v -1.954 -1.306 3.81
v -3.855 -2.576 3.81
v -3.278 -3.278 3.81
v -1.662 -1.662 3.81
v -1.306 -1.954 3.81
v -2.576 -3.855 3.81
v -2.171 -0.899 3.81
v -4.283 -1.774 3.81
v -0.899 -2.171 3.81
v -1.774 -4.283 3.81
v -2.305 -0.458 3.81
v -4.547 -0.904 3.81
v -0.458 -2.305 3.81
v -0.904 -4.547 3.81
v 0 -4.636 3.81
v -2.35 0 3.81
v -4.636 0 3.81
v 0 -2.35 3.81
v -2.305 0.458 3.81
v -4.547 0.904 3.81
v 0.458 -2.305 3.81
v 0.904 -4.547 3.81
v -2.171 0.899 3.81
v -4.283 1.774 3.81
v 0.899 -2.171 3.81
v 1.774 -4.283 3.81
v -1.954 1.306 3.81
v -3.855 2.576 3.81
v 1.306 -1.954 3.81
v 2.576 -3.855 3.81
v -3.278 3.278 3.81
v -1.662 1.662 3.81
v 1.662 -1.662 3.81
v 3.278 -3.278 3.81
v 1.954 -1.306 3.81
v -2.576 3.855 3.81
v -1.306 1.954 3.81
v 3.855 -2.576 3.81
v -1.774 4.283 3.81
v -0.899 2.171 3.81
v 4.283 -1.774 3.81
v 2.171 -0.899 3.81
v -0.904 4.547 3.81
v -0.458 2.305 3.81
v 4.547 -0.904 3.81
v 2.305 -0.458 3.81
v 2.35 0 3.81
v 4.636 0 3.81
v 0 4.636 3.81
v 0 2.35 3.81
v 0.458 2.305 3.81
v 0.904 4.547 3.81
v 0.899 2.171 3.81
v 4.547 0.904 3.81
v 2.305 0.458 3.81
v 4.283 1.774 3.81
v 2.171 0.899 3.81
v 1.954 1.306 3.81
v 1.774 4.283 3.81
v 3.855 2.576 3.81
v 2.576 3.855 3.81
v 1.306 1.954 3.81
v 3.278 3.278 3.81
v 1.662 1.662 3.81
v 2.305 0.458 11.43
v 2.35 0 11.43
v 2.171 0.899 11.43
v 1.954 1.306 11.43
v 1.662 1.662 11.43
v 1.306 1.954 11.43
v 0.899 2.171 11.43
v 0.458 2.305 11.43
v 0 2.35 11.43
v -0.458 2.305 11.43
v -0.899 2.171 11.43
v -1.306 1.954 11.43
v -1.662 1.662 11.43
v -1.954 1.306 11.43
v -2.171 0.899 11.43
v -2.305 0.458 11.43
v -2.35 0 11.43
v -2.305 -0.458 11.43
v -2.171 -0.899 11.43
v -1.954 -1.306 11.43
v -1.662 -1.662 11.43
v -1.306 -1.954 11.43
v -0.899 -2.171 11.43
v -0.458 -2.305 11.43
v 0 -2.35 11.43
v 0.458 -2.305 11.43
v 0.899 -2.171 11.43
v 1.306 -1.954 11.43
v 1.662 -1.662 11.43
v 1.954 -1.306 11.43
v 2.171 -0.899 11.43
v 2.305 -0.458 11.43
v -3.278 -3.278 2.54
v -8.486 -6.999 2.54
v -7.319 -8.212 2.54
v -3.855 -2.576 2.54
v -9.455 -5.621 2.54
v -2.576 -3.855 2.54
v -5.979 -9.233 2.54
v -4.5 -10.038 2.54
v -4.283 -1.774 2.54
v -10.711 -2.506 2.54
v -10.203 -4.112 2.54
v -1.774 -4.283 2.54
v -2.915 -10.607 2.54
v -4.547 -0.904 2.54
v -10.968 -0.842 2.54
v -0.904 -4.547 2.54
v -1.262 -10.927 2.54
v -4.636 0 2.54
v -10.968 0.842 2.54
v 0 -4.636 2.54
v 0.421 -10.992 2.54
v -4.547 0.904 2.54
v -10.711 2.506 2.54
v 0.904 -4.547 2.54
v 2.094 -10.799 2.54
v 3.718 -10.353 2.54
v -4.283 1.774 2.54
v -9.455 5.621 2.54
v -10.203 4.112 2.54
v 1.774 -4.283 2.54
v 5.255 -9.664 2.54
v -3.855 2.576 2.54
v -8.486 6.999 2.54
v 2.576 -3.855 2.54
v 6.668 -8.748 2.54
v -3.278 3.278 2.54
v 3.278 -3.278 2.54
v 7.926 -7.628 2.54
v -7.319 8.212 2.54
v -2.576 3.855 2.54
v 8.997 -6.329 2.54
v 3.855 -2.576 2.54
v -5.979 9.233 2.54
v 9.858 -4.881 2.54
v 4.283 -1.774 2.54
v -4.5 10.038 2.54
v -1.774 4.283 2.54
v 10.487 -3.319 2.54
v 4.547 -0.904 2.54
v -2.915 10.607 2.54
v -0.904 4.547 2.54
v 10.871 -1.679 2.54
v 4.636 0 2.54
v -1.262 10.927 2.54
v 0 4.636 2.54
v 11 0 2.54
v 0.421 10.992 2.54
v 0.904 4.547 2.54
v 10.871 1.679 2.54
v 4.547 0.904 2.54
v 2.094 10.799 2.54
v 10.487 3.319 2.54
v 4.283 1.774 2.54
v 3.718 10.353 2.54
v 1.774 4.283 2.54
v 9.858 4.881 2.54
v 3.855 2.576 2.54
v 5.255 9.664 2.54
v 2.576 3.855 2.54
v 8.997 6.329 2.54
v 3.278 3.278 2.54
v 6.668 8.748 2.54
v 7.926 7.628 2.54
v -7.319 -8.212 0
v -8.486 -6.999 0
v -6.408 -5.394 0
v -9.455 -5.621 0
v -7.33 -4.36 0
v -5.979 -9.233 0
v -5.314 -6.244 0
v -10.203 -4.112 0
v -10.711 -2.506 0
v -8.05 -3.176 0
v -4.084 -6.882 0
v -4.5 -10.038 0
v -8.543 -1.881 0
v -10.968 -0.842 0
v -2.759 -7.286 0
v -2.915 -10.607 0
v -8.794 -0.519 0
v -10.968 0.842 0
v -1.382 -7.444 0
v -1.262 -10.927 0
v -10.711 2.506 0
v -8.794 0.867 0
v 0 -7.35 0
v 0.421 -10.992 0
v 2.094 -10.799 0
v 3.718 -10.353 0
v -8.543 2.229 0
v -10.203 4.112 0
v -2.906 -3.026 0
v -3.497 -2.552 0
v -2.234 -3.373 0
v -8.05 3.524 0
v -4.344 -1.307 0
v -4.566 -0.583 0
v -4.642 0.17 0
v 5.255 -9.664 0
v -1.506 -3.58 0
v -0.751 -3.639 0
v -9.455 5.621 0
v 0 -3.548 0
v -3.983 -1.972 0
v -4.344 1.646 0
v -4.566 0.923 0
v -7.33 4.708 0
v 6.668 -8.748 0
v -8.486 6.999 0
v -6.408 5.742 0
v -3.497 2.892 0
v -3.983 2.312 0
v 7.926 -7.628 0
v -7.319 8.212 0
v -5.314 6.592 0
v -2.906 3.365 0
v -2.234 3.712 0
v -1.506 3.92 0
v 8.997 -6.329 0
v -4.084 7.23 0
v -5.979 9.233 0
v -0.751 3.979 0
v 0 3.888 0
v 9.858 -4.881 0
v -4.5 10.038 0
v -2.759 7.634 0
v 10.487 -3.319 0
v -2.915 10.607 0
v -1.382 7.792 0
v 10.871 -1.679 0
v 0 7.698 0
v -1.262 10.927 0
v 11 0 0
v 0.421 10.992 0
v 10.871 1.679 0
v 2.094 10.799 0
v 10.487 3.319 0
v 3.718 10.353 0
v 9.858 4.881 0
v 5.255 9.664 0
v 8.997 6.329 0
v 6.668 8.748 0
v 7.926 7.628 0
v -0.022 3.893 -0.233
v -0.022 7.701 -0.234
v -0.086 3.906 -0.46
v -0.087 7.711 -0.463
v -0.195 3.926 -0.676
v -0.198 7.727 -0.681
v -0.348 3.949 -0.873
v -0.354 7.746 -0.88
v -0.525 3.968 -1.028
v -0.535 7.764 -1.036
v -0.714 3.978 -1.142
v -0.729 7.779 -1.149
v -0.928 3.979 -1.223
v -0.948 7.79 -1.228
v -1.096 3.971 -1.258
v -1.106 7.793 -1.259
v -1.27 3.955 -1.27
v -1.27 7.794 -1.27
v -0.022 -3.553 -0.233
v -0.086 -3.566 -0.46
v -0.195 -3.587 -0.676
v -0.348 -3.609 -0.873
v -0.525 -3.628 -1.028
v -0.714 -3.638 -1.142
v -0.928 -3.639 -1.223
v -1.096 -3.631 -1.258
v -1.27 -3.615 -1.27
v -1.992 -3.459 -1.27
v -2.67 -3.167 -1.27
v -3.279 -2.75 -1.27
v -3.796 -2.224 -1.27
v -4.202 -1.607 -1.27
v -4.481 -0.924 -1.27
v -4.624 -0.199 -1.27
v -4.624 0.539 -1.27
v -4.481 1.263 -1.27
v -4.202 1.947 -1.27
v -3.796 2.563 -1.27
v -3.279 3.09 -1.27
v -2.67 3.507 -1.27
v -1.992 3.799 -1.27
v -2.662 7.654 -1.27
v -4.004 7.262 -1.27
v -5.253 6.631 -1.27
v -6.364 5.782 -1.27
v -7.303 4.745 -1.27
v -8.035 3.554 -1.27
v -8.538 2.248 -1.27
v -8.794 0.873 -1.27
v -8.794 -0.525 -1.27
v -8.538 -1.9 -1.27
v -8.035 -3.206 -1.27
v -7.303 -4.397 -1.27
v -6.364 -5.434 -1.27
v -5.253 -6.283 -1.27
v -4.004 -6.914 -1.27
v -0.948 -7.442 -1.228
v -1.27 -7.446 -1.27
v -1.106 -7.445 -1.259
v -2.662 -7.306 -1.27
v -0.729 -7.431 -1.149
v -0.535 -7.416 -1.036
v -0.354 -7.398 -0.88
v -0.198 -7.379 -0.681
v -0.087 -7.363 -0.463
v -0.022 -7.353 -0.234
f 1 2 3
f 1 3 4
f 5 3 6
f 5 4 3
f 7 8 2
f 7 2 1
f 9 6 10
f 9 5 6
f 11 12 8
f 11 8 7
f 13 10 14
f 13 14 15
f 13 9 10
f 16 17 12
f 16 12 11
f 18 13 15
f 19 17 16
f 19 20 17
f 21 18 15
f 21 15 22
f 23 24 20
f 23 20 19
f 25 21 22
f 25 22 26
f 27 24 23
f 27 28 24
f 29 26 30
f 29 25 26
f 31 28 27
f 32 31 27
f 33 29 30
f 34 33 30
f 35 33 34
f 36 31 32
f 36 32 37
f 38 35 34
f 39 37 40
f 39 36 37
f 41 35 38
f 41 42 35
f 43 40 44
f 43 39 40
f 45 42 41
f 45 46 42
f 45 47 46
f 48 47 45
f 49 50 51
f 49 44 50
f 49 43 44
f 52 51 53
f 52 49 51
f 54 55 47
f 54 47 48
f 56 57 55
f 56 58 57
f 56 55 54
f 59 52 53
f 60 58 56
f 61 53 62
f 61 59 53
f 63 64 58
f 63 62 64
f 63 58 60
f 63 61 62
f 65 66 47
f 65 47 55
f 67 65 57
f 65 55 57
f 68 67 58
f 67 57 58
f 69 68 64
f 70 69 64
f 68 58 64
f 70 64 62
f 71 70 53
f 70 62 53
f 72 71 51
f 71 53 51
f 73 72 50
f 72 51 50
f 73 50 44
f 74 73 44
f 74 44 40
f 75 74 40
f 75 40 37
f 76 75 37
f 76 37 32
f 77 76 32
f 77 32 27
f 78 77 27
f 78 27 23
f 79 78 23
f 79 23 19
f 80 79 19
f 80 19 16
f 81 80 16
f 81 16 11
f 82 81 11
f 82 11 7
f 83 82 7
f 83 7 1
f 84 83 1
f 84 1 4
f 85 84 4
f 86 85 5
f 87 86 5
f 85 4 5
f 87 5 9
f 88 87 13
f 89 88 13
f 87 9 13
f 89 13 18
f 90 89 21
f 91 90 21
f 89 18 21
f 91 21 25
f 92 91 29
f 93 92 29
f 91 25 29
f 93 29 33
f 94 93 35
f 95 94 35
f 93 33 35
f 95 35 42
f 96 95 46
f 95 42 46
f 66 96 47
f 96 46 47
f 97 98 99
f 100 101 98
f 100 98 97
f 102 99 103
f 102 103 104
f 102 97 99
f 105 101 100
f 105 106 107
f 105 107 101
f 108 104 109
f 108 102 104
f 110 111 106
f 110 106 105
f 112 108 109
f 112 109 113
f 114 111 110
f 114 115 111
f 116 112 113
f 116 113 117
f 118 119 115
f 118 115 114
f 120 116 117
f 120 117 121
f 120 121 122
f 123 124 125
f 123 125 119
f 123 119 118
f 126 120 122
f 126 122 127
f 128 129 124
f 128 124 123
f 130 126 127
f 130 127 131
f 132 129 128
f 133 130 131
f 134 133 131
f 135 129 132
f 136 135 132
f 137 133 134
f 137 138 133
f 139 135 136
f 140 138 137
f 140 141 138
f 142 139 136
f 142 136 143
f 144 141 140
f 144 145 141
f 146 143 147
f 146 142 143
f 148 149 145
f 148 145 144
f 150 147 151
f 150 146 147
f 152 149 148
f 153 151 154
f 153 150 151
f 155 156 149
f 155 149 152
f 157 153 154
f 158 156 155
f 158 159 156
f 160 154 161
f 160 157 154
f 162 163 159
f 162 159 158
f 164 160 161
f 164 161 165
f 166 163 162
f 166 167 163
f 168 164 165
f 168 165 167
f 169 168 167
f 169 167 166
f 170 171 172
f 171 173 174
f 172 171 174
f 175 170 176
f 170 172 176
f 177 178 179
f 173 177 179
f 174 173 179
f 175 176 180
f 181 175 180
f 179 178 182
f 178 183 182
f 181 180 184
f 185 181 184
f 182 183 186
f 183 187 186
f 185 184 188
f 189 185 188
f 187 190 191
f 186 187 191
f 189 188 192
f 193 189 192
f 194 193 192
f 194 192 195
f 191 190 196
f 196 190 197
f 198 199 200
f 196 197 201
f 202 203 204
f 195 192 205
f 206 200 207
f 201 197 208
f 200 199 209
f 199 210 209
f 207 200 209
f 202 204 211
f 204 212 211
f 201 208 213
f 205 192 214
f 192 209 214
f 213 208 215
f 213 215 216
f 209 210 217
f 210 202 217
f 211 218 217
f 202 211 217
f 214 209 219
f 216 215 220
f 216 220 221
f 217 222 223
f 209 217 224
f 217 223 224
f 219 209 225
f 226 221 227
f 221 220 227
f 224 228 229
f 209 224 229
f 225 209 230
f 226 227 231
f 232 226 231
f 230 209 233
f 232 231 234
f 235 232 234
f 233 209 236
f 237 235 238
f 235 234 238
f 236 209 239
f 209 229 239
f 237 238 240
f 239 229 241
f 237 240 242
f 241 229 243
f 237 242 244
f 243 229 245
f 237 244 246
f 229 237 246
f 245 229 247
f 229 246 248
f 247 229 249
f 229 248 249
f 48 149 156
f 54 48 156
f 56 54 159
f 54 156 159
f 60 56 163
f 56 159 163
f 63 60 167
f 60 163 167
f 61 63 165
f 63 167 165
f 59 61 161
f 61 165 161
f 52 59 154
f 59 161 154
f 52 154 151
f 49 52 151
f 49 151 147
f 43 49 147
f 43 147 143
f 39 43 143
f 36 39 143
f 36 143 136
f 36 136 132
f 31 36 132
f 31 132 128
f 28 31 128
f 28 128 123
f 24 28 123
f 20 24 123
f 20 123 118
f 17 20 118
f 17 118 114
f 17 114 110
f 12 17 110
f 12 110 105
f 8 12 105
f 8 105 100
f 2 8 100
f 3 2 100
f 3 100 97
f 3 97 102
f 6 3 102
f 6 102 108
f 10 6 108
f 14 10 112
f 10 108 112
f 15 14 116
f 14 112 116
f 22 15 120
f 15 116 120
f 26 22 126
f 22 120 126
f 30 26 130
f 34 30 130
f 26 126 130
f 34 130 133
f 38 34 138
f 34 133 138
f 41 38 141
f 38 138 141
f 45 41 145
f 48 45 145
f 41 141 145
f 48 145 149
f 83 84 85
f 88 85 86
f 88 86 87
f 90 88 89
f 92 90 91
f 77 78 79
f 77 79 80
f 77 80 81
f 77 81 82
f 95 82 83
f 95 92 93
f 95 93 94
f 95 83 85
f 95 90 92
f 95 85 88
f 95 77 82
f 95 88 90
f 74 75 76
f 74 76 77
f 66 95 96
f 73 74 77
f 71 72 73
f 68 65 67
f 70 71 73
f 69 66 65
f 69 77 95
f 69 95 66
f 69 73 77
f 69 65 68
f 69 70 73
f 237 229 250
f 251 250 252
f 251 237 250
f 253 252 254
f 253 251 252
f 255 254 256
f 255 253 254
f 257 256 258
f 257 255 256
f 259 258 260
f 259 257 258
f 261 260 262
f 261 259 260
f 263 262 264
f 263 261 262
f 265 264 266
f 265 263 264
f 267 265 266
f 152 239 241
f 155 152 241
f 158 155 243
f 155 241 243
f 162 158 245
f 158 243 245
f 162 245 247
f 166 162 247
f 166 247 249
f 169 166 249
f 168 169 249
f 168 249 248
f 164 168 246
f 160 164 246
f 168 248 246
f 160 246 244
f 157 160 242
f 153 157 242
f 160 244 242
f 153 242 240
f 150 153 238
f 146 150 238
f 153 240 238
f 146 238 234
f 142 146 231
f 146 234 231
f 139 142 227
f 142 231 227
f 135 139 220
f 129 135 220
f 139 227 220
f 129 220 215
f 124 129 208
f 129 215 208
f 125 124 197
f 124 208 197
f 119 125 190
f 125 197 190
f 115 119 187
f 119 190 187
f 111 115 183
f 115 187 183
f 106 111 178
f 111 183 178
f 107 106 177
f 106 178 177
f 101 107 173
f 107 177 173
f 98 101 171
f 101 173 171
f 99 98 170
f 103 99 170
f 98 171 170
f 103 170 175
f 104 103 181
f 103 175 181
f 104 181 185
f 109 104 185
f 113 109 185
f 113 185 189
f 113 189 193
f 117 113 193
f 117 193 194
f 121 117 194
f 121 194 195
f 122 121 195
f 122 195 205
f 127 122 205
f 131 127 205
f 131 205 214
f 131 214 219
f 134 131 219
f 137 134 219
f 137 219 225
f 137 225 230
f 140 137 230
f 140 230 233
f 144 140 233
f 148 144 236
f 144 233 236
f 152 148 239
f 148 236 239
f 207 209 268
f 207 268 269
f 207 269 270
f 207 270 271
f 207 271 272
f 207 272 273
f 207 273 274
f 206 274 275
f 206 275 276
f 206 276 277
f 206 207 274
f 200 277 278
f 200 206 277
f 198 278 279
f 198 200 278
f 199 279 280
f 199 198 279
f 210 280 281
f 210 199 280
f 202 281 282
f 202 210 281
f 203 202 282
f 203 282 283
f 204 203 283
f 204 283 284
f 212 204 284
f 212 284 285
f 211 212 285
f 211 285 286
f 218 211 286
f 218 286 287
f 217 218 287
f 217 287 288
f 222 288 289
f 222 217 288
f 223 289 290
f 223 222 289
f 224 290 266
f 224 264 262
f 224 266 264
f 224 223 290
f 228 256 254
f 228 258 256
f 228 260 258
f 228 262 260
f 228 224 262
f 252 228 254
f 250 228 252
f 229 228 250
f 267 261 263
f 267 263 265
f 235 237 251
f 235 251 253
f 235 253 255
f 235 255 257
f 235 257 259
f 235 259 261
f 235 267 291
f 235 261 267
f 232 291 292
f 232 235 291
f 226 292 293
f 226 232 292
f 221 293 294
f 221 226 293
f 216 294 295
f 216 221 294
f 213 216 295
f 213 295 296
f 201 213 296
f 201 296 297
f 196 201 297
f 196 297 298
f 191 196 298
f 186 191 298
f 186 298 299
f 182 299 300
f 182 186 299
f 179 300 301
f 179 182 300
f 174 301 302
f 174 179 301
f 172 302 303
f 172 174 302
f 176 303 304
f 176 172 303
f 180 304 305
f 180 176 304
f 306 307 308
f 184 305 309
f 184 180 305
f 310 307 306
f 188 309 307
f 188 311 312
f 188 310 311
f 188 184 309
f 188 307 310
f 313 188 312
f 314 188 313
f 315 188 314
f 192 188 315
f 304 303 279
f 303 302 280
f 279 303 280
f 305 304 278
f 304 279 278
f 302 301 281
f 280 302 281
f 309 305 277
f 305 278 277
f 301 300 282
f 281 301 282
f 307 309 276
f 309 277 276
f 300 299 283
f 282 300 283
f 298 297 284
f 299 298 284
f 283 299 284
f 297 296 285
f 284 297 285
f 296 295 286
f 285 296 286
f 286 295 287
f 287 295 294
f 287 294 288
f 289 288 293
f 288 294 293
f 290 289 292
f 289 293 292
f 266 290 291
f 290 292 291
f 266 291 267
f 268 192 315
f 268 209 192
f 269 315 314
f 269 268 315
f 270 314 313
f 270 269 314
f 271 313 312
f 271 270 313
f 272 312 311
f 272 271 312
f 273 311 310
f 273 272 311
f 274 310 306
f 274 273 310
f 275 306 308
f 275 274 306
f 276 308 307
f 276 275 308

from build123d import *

# Parameters (mm, degrees)
F0_R     = 2.35
F1_DEPTH = 11.43
F0_R_2   = 4.636
F2_DEPTH = 3.81
F0_R_3   = 11
F3_DEPTH = 2.54
F5_DEPTH = 1.27
F6_R     = 1.26999


# Not quite as in the source:
# - a fillet or chamfer is up to 0.001 mm smaller than in the source, because OpenCascade refuses the exact size


with BuildPart() as f1:
    # F0 (on Top) → F1 (new body)
    with BuildSketch(Plane.XY):
        Circle(F0_R)
    extrude(amount=F1_DEPTH)

    # F0 (on Top) → F2 (join)
    with BuildSketch(Plane.XY):
        Circle(F0_R_2)
        Circle(F0_R, mode=Mode.SUBTRACT)
    extrude(amount=F2_DEPTH)

    # F0 (on Top) → F3 (join)
    with BuildSketch(Plane.XY):
        Circle(F0_R_3)
        Circle(F0_R_2, mode=Mode.SUBTRACT)
    extrude(amount=F3_DEPTH)

    # F4 (on face) → F5 (join)
    with BuildSketch(Plane.XY):
        with BuildLine():
            Line((0, 3.888), (0, 7.698))
            ThreePointArc((0, 7.698), (-8.8259203096, 0.174027897), (0, -7.349944206))
            Line((0, -7.349944206), (0, -3.5482488357))
            ThreePointArc((0, -3.5482488357), (-4.6416554656, 0.1698755822), (0, 3.888))
        make_face()
    extrude(amount=-F5_DEPTH)

    # F6 (radius 1.27 in the source; OpenCascade refuses exactly that, so slightly less here)
    f6_edges = [f1.edges().sort_by_distance(p)[0] for p in [
        (0, 5.793, -1.27),
        (0, -5.449097, -1.27),
    ]]
    fillet(f6_edges, radius=F6_R)


solid = f1.part
